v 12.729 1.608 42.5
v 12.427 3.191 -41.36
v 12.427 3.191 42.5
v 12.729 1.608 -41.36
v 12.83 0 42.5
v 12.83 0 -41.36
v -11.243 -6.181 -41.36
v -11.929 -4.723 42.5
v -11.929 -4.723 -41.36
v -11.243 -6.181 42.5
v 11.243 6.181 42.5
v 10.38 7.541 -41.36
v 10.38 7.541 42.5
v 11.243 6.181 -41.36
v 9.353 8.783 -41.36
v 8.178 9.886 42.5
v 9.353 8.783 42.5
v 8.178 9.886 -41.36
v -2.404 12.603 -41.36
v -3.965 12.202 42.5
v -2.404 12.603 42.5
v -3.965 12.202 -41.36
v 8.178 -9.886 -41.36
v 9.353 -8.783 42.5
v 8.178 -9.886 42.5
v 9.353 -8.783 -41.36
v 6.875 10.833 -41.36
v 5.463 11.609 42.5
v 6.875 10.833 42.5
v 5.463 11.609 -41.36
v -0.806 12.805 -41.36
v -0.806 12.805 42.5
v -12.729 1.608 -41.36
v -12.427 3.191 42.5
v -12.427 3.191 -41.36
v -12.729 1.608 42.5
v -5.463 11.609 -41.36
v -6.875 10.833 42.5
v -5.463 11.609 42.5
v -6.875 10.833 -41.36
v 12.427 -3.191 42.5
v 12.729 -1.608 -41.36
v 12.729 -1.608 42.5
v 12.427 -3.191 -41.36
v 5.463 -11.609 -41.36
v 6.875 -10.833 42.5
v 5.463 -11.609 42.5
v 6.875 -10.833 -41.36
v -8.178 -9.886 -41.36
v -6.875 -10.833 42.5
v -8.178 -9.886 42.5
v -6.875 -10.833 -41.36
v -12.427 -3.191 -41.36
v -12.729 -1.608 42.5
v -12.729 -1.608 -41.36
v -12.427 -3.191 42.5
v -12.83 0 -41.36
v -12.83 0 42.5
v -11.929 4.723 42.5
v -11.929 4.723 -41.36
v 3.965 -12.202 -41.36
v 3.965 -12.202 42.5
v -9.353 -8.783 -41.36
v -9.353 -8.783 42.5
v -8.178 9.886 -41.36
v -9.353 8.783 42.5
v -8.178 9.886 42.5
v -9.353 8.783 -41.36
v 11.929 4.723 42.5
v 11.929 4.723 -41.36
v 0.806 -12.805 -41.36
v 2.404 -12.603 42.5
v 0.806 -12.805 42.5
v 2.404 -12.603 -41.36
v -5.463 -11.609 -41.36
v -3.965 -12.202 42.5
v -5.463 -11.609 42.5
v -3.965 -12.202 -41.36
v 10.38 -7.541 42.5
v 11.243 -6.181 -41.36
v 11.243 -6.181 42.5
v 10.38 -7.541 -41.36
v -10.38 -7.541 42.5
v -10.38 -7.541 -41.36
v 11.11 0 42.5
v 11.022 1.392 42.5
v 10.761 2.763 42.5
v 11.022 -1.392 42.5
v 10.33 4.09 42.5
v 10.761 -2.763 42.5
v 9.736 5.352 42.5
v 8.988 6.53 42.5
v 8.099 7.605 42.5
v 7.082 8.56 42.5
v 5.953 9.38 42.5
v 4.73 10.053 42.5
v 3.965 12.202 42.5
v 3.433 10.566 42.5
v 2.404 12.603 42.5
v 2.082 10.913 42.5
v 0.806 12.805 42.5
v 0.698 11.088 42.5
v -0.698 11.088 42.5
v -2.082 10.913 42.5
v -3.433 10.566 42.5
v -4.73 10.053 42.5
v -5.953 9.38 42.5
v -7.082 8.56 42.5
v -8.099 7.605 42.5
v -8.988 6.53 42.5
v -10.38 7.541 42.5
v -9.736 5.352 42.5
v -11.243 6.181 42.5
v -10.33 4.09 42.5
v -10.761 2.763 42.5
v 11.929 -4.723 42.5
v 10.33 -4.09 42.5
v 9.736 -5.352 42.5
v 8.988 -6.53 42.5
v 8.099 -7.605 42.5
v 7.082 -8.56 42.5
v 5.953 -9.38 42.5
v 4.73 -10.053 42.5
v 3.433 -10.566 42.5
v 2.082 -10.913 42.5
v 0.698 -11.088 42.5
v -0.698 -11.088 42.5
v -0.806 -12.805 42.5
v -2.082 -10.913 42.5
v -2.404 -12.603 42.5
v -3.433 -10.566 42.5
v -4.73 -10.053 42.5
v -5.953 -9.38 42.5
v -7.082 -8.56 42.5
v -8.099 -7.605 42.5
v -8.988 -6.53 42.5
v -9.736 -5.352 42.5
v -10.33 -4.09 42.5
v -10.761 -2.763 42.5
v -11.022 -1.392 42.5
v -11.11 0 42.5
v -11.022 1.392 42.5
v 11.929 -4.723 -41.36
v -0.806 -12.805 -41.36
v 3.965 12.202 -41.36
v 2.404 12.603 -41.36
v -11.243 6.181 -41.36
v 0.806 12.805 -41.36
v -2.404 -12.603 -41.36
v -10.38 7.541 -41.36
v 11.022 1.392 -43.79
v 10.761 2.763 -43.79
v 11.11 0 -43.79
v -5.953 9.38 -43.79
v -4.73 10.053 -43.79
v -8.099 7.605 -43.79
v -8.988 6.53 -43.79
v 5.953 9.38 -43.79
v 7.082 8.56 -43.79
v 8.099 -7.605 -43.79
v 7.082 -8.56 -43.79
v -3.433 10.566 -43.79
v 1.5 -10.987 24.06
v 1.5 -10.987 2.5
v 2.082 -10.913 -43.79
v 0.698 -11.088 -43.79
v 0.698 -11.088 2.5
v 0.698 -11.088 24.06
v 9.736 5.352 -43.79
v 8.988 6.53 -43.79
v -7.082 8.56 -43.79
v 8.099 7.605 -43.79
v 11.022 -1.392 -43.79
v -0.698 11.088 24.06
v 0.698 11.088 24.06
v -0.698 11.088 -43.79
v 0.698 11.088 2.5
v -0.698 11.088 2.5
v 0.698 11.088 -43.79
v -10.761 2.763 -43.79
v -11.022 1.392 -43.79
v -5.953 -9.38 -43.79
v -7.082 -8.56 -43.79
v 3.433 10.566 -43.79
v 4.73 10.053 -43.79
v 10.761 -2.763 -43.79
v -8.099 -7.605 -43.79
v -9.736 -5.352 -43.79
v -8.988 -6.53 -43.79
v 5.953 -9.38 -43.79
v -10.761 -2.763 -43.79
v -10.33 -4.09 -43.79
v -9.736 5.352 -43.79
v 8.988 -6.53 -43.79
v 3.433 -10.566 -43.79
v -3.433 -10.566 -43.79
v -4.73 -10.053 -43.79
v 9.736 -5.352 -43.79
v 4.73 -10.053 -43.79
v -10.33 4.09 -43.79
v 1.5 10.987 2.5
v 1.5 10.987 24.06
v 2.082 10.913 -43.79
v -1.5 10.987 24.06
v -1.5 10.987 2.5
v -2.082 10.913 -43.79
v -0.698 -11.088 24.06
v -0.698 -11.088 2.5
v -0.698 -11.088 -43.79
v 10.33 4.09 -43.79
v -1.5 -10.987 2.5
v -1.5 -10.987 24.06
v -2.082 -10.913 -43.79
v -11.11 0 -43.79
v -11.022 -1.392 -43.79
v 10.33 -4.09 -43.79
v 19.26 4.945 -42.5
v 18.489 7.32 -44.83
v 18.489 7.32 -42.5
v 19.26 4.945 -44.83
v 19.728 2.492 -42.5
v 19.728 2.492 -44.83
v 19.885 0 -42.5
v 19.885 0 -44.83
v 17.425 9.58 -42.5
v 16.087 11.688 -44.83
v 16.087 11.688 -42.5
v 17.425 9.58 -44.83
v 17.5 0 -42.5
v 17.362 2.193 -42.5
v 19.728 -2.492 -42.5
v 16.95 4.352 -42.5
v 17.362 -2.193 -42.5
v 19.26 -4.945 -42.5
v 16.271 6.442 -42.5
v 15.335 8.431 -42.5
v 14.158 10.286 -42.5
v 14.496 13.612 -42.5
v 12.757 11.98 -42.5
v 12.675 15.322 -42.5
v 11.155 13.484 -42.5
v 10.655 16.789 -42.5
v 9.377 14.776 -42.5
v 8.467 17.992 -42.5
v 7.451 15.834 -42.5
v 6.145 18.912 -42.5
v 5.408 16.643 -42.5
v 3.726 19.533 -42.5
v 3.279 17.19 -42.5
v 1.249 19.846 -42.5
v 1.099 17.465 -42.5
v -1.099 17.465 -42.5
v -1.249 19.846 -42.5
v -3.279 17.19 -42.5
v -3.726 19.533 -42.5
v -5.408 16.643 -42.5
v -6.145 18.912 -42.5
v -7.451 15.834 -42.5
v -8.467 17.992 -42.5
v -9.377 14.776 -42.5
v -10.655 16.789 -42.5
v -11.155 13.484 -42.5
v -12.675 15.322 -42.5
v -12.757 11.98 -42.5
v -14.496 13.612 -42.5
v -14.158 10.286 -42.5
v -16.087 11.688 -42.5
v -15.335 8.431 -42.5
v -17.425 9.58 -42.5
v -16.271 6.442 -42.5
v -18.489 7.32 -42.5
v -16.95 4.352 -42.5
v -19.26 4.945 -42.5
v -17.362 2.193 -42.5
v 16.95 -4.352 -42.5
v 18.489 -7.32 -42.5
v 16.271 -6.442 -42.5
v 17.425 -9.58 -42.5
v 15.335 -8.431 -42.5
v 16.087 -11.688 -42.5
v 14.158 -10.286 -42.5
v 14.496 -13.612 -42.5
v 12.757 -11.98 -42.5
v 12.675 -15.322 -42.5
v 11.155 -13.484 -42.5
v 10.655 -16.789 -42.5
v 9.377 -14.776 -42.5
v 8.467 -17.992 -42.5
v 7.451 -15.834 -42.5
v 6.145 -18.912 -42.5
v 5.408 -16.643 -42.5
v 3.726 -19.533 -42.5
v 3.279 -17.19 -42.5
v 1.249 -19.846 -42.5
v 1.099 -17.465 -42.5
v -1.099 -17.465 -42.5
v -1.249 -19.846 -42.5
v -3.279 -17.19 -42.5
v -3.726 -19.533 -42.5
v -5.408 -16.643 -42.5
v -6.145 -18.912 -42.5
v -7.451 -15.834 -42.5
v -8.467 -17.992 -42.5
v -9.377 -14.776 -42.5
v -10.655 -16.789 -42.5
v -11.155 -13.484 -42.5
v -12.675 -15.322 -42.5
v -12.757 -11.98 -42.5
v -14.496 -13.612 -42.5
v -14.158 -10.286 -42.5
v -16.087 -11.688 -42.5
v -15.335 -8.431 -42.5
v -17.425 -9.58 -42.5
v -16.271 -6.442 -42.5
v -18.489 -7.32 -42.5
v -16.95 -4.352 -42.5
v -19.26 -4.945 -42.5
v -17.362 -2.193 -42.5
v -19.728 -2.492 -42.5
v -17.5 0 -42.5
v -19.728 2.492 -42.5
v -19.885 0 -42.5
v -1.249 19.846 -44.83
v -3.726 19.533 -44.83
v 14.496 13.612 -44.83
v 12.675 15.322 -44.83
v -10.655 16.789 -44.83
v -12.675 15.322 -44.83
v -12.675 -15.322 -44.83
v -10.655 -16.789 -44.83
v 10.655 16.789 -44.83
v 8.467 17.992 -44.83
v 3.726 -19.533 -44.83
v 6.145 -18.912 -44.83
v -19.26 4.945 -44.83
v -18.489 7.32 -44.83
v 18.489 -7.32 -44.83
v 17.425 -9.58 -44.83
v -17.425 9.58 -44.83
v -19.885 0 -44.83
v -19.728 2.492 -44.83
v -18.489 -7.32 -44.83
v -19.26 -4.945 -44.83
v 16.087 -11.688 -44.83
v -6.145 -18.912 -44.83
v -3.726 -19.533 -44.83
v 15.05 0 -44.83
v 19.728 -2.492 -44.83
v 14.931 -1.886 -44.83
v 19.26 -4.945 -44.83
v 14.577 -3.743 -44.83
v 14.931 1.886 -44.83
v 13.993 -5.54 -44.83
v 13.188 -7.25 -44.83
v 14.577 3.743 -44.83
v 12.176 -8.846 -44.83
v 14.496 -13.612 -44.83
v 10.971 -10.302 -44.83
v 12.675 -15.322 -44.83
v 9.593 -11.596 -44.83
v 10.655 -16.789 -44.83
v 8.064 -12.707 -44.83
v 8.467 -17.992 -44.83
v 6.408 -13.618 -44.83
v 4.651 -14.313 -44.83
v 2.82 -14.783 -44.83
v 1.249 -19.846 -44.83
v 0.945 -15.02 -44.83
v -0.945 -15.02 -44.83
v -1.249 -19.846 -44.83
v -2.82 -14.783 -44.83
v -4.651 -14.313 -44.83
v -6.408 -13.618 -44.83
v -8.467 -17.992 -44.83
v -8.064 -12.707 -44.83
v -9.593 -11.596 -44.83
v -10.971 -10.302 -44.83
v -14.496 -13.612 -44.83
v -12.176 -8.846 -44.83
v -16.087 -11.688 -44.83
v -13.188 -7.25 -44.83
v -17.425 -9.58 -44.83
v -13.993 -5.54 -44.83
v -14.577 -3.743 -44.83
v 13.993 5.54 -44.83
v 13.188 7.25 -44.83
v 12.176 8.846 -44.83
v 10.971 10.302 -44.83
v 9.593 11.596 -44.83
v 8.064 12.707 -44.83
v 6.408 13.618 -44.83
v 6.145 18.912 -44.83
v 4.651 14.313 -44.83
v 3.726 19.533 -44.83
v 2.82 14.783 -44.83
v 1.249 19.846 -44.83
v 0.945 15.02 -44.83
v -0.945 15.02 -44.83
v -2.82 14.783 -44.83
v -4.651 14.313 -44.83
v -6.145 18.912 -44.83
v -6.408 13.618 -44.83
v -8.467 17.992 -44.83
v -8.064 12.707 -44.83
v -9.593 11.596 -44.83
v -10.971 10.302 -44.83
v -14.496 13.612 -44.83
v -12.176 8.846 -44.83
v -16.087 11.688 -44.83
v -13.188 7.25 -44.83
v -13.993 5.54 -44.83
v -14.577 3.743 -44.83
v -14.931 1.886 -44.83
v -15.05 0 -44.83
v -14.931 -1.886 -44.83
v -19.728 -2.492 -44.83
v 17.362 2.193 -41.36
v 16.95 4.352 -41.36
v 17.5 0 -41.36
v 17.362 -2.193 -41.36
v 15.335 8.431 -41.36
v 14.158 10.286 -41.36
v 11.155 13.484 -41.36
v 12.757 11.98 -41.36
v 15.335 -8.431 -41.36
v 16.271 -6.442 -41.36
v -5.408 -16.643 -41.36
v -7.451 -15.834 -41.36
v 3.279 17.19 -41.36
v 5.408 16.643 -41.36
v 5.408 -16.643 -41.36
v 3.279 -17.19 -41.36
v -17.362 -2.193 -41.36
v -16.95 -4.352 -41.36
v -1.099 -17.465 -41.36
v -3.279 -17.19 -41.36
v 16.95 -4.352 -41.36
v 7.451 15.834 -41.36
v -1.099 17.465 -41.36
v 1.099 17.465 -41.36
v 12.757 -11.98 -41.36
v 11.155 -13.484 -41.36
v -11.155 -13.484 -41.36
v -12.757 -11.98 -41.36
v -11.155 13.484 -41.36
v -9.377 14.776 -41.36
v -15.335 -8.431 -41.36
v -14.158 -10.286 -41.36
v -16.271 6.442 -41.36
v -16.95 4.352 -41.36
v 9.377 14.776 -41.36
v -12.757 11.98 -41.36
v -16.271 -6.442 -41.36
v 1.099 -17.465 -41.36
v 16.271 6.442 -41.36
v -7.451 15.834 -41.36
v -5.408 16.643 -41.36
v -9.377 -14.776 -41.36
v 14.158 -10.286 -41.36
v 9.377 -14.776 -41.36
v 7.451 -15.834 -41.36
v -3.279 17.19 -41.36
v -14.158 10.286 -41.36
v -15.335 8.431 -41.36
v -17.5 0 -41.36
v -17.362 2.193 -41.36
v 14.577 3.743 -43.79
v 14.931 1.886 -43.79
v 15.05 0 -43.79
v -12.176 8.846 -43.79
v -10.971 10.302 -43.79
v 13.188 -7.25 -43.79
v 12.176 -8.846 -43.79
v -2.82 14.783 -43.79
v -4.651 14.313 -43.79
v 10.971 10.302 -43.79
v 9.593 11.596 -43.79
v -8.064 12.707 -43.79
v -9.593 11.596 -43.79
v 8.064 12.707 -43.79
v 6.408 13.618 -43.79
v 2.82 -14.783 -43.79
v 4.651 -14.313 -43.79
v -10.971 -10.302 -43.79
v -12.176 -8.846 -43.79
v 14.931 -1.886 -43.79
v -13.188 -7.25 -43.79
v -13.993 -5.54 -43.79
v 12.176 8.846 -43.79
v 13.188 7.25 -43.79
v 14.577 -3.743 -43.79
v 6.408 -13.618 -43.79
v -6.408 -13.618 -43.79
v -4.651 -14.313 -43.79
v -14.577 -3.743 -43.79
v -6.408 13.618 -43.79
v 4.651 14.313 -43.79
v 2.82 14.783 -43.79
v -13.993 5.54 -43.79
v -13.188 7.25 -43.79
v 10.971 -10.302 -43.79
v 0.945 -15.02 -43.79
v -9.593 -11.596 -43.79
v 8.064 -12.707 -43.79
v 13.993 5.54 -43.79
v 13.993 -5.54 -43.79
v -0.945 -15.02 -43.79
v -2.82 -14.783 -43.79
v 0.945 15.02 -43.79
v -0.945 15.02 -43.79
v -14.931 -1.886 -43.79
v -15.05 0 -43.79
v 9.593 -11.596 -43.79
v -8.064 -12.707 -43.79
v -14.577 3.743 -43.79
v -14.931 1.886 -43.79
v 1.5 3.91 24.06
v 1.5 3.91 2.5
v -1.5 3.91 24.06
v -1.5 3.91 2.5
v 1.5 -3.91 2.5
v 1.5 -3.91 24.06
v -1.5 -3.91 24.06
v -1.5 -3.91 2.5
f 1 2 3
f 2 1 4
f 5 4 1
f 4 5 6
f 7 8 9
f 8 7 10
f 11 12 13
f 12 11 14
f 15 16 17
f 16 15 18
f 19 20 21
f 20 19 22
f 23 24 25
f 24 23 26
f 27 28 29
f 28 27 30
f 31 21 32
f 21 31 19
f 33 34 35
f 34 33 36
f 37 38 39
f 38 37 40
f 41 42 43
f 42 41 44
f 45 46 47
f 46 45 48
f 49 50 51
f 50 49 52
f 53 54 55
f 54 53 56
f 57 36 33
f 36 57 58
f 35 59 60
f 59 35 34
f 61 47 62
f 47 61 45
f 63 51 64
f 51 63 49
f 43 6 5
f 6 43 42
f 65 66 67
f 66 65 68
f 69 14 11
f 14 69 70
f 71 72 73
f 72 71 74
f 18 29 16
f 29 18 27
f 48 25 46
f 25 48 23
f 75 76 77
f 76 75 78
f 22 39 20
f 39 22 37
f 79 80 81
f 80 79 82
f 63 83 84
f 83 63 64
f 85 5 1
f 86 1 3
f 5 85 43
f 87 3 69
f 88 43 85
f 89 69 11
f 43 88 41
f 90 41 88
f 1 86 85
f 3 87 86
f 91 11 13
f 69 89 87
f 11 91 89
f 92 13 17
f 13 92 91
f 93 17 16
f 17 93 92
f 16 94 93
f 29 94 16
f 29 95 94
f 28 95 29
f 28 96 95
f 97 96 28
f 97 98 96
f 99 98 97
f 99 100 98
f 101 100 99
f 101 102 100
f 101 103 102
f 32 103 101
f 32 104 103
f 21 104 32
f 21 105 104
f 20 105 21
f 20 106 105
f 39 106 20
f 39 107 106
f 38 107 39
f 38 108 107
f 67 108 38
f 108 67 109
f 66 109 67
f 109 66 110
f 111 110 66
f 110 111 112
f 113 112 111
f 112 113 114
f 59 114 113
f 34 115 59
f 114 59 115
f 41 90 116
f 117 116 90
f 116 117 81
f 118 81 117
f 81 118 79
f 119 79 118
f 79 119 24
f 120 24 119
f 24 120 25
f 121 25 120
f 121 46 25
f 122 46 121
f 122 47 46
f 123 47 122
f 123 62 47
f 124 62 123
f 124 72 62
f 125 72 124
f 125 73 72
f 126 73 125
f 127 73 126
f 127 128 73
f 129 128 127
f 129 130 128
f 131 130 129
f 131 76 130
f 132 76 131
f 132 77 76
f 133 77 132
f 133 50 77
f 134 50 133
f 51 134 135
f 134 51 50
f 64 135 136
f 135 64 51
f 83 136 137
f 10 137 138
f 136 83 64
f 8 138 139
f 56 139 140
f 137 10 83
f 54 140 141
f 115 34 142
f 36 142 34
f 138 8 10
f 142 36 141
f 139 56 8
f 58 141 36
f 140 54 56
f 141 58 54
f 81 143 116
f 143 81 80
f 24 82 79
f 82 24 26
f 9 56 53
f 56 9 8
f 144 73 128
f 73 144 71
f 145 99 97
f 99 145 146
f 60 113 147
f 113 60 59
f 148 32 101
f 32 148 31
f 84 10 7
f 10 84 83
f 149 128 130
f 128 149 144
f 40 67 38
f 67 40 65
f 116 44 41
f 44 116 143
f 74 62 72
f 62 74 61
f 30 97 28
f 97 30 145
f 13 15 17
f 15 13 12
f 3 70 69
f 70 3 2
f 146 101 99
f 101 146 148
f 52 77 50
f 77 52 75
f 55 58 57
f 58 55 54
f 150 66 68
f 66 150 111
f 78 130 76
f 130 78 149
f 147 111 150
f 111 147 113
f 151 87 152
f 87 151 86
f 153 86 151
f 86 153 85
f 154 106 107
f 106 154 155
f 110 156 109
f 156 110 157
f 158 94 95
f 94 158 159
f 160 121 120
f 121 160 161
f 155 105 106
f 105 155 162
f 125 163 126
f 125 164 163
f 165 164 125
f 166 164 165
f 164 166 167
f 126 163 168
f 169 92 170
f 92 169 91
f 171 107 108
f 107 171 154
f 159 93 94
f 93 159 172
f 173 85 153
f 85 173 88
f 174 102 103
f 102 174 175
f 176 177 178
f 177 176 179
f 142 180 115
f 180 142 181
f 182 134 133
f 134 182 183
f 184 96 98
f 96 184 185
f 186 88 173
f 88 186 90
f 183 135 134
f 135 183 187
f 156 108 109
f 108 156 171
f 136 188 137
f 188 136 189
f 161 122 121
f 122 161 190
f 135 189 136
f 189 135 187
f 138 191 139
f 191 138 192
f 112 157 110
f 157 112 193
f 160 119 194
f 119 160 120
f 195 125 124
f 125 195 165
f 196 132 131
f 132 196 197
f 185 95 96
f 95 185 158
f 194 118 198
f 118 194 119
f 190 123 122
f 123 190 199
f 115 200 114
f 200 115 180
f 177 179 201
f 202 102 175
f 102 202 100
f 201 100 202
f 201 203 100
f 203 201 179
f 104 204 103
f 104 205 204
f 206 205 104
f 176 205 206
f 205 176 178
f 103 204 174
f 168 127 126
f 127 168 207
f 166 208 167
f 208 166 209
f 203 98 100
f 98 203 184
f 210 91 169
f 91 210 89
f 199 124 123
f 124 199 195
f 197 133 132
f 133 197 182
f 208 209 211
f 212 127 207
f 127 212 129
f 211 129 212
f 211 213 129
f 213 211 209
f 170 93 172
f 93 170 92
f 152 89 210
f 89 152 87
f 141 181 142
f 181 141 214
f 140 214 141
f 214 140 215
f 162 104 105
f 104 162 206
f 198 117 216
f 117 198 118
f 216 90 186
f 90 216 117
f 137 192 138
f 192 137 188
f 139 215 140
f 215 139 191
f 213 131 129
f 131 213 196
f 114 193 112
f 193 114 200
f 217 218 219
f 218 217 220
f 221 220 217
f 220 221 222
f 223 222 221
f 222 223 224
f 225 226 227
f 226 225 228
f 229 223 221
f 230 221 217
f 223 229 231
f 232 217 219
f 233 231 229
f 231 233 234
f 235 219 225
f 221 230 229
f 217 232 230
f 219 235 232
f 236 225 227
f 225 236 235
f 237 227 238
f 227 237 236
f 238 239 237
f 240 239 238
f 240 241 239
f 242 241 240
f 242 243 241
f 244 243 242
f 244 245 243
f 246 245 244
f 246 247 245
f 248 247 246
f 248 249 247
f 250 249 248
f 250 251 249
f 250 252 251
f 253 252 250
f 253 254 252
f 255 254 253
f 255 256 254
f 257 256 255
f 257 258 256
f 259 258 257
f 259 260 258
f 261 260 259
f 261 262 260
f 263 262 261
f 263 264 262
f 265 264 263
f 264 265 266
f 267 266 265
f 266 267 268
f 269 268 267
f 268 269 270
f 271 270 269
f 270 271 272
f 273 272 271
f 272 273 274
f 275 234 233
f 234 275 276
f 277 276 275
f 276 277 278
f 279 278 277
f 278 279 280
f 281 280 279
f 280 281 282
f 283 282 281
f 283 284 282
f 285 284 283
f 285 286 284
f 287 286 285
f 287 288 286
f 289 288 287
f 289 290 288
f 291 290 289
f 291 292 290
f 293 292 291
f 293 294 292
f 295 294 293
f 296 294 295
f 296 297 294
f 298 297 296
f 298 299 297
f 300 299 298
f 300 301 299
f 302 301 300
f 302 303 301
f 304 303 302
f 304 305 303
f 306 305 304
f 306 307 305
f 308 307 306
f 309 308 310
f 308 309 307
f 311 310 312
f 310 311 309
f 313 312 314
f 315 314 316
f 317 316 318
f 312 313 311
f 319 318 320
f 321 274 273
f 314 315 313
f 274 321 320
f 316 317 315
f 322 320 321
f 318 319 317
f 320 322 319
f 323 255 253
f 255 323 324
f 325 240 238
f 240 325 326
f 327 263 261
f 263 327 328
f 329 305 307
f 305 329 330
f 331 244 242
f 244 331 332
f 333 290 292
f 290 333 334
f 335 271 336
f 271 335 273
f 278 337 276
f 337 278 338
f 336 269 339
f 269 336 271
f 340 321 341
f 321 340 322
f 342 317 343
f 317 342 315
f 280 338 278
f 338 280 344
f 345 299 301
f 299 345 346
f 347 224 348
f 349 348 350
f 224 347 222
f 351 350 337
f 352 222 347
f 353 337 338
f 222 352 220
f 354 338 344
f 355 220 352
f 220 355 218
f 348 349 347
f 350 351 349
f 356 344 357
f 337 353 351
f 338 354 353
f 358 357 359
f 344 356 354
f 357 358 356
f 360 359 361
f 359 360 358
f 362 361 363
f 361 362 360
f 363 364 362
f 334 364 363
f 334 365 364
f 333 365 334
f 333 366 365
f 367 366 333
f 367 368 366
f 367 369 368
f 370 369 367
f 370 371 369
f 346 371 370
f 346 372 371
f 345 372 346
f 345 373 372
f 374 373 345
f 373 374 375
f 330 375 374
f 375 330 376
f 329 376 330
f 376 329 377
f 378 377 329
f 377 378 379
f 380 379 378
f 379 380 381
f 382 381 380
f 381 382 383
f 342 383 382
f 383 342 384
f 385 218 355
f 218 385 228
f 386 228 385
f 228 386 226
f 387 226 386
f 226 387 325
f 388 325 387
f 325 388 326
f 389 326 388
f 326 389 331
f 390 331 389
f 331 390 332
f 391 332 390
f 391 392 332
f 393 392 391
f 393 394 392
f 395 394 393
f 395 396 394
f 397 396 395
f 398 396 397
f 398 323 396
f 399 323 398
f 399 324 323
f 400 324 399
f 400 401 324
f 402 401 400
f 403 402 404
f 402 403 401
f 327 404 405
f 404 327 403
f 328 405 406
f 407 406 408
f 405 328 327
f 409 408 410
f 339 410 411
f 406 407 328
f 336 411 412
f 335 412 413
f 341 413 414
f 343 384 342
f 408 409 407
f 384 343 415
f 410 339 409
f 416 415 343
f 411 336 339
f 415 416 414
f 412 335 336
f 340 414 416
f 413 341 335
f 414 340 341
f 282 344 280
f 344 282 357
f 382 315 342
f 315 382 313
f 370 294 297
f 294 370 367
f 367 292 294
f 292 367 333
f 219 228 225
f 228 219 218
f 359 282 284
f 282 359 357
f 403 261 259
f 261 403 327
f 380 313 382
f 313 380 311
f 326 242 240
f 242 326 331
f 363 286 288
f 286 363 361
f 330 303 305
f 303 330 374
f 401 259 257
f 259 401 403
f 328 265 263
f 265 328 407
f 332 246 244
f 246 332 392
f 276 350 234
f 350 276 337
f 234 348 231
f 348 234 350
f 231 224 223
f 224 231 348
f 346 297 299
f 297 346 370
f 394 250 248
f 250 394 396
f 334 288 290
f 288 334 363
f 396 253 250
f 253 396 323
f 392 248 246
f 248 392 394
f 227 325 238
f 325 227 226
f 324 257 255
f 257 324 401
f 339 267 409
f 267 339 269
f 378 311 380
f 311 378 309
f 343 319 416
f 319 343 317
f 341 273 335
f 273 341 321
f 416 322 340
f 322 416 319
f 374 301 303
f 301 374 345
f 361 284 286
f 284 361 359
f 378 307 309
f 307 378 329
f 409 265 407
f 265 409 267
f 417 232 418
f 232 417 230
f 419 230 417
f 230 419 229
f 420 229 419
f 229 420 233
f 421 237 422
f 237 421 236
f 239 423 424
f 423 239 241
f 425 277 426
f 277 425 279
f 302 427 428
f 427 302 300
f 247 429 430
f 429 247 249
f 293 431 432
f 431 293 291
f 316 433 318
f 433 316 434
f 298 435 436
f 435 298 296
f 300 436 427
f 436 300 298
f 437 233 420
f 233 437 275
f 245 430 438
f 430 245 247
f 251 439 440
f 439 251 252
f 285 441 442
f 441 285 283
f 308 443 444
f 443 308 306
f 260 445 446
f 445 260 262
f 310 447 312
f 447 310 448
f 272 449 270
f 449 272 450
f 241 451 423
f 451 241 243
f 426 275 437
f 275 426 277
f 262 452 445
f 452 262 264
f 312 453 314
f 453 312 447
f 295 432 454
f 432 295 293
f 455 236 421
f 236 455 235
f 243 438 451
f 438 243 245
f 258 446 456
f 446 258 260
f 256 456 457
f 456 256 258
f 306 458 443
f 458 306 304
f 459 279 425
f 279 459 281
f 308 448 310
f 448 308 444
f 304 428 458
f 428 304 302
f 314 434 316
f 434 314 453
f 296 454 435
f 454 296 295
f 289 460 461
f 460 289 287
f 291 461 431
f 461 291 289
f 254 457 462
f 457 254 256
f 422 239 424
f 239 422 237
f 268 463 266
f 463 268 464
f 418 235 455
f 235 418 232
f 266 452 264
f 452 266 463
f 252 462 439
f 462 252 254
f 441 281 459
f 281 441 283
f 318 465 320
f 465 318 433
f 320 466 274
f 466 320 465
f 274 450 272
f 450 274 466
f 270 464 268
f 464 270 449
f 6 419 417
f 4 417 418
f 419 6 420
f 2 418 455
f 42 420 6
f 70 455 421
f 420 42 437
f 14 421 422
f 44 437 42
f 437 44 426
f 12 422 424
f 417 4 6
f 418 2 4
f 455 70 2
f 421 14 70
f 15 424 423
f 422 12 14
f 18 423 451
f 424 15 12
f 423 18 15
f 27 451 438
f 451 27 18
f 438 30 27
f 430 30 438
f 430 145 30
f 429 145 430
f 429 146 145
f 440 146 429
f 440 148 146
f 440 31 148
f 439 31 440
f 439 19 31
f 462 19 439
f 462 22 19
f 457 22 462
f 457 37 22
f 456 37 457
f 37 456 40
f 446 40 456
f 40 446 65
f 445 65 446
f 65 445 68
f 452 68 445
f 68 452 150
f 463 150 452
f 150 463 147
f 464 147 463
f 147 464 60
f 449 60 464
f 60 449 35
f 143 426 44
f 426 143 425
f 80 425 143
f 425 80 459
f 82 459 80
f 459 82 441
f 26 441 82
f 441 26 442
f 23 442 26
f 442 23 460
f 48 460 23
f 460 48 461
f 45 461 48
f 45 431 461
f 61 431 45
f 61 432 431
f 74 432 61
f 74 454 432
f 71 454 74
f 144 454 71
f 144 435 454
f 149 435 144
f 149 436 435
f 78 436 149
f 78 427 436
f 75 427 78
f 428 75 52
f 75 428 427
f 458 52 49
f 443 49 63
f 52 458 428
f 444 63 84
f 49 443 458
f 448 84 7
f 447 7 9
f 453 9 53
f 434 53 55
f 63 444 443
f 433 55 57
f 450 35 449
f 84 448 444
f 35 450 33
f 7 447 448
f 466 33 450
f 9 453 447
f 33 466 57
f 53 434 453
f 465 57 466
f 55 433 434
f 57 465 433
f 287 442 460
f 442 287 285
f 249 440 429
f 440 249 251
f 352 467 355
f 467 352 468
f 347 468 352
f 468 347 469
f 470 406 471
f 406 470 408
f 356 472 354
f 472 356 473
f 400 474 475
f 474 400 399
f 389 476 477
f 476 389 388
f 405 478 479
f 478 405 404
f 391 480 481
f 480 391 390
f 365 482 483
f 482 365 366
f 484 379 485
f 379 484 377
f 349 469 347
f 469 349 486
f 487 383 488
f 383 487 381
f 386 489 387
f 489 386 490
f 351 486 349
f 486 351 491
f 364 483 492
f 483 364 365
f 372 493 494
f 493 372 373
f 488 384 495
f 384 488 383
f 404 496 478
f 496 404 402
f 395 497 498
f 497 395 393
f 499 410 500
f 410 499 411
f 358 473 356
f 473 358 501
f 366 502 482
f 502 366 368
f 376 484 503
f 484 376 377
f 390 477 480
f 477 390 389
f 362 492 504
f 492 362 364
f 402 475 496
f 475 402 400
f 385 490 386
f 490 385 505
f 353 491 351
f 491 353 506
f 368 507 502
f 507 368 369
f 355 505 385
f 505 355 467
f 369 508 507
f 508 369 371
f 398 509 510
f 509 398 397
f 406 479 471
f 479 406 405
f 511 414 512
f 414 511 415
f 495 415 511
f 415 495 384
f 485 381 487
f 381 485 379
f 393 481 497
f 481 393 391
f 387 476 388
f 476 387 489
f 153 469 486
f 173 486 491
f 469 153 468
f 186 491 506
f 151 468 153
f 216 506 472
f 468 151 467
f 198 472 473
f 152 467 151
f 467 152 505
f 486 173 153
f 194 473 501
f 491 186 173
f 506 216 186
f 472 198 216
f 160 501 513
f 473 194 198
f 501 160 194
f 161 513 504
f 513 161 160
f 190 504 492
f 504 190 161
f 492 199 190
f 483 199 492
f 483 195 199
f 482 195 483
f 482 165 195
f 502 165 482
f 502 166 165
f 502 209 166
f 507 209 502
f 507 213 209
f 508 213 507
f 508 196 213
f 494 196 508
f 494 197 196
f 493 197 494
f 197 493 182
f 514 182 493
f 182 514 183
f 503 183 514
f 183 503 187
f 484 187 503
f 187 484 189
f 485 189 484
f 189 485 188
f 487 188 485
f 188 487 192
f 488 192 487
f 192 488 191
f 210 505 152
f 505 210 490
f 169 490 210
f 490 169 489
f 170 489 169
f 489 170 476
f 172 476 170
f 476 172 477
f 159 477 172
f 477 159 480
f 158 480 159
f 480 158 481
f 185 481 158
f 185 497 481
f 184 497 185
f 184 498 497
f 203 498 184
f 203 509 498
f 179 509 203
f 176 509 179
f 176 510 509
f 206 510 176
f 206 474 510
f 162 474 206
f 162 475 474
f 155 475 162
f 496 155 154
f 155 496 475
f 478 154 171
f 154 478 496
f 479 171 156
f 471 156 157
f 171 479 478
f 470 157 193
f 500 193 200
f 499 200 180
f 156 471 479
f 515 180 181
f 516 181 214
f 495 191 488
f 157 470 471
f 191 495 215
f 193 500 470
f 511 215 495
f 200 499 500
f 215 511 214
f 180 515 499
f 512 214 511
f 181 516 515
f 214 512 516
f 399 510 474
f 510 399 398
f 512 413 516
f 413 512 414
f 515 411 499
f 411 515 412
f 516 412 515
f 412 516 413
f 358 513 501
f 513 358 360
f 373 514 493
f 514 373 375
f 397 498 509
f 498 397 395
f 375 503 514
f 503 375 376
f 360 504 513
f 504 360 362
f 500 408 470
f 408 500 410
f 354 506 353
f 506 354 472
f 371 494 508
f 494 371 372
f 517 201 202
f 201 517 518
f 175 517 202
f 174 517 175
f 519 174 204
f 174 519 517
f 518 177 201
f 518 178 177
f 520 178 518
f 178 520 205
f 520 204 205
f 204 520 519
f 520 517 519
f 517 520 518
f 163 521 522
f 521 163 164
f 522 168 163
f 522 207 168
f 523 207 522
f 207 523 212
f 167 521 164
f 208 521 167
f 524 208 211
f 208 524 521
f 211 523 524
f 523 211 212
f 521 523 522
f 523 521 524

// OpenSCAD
HEIGHT = 85;
$fn = 50;

module Patterson_tank_tube () {
    BASE_D = 39.77;
    BASE_H = 2.33;

    RISE_OD = 35;
    RISE_ID = 30.1;
    RISE_H = 1.14;

    TUBE_ID = 22.22;
    TUBE_OD = 25.66;//INCH, basically

    BLOCK_H = 18.44; //CONSTANT
    BLOCK_W = 3;
    BLOCK_L = 40 - 18.44; //ROUGH
    BLOCK_T = 7.2;
    
    //MAIN TUBE
    difference () {
        cylinder(r = TUBE_OD / 2, h = HEIGHT, center = true);
        cylinder(r = TUBE_ID / 2, h = HEIGHT + 1, center = true);
    }
    
    //BASE
    translate([0, 0, -(HEIGHT / 2) - (BASE_H / 2)]) {
        difference () {
            union () {
                cylinder(r = BASE_D / 2, h = BASE_H, center = true);
                translate([0, 0, (BASE_H / 2) + (RISE_H / 2)]) cylinder(r = RISE_OD / 2, h = RISE_H, center = true);
            }
            translate([0, 0, - (BASE_H / 2) + (RISE_H / 2) - .1]) cylinder(r = RISE_ID / 2, h = RISE_H, center = true);
            cylinder(r = TUBE_ID / 2, h = HEIGHT + 1, center = true);
        }
    }
    
    //BLOCKS
    translate ([0, 0, (HEIGHT / 2) - (BLOCK_L / 2) - BLOCK_H]) {
        translate([0, (TUBE_ID / 2) - (BLOCK_T / 2), 0]) cube([BLOCK_W, BLOCK_T, BLOCK_L], center = true);
        translate([0, -(TUBE_ID / 2) + (BLOCK_T / 2), 0]) cube([BLOCK_W, BLOCK_T, BLOCK_L], center = true);
    }
}

Patterson_tank_tube();
